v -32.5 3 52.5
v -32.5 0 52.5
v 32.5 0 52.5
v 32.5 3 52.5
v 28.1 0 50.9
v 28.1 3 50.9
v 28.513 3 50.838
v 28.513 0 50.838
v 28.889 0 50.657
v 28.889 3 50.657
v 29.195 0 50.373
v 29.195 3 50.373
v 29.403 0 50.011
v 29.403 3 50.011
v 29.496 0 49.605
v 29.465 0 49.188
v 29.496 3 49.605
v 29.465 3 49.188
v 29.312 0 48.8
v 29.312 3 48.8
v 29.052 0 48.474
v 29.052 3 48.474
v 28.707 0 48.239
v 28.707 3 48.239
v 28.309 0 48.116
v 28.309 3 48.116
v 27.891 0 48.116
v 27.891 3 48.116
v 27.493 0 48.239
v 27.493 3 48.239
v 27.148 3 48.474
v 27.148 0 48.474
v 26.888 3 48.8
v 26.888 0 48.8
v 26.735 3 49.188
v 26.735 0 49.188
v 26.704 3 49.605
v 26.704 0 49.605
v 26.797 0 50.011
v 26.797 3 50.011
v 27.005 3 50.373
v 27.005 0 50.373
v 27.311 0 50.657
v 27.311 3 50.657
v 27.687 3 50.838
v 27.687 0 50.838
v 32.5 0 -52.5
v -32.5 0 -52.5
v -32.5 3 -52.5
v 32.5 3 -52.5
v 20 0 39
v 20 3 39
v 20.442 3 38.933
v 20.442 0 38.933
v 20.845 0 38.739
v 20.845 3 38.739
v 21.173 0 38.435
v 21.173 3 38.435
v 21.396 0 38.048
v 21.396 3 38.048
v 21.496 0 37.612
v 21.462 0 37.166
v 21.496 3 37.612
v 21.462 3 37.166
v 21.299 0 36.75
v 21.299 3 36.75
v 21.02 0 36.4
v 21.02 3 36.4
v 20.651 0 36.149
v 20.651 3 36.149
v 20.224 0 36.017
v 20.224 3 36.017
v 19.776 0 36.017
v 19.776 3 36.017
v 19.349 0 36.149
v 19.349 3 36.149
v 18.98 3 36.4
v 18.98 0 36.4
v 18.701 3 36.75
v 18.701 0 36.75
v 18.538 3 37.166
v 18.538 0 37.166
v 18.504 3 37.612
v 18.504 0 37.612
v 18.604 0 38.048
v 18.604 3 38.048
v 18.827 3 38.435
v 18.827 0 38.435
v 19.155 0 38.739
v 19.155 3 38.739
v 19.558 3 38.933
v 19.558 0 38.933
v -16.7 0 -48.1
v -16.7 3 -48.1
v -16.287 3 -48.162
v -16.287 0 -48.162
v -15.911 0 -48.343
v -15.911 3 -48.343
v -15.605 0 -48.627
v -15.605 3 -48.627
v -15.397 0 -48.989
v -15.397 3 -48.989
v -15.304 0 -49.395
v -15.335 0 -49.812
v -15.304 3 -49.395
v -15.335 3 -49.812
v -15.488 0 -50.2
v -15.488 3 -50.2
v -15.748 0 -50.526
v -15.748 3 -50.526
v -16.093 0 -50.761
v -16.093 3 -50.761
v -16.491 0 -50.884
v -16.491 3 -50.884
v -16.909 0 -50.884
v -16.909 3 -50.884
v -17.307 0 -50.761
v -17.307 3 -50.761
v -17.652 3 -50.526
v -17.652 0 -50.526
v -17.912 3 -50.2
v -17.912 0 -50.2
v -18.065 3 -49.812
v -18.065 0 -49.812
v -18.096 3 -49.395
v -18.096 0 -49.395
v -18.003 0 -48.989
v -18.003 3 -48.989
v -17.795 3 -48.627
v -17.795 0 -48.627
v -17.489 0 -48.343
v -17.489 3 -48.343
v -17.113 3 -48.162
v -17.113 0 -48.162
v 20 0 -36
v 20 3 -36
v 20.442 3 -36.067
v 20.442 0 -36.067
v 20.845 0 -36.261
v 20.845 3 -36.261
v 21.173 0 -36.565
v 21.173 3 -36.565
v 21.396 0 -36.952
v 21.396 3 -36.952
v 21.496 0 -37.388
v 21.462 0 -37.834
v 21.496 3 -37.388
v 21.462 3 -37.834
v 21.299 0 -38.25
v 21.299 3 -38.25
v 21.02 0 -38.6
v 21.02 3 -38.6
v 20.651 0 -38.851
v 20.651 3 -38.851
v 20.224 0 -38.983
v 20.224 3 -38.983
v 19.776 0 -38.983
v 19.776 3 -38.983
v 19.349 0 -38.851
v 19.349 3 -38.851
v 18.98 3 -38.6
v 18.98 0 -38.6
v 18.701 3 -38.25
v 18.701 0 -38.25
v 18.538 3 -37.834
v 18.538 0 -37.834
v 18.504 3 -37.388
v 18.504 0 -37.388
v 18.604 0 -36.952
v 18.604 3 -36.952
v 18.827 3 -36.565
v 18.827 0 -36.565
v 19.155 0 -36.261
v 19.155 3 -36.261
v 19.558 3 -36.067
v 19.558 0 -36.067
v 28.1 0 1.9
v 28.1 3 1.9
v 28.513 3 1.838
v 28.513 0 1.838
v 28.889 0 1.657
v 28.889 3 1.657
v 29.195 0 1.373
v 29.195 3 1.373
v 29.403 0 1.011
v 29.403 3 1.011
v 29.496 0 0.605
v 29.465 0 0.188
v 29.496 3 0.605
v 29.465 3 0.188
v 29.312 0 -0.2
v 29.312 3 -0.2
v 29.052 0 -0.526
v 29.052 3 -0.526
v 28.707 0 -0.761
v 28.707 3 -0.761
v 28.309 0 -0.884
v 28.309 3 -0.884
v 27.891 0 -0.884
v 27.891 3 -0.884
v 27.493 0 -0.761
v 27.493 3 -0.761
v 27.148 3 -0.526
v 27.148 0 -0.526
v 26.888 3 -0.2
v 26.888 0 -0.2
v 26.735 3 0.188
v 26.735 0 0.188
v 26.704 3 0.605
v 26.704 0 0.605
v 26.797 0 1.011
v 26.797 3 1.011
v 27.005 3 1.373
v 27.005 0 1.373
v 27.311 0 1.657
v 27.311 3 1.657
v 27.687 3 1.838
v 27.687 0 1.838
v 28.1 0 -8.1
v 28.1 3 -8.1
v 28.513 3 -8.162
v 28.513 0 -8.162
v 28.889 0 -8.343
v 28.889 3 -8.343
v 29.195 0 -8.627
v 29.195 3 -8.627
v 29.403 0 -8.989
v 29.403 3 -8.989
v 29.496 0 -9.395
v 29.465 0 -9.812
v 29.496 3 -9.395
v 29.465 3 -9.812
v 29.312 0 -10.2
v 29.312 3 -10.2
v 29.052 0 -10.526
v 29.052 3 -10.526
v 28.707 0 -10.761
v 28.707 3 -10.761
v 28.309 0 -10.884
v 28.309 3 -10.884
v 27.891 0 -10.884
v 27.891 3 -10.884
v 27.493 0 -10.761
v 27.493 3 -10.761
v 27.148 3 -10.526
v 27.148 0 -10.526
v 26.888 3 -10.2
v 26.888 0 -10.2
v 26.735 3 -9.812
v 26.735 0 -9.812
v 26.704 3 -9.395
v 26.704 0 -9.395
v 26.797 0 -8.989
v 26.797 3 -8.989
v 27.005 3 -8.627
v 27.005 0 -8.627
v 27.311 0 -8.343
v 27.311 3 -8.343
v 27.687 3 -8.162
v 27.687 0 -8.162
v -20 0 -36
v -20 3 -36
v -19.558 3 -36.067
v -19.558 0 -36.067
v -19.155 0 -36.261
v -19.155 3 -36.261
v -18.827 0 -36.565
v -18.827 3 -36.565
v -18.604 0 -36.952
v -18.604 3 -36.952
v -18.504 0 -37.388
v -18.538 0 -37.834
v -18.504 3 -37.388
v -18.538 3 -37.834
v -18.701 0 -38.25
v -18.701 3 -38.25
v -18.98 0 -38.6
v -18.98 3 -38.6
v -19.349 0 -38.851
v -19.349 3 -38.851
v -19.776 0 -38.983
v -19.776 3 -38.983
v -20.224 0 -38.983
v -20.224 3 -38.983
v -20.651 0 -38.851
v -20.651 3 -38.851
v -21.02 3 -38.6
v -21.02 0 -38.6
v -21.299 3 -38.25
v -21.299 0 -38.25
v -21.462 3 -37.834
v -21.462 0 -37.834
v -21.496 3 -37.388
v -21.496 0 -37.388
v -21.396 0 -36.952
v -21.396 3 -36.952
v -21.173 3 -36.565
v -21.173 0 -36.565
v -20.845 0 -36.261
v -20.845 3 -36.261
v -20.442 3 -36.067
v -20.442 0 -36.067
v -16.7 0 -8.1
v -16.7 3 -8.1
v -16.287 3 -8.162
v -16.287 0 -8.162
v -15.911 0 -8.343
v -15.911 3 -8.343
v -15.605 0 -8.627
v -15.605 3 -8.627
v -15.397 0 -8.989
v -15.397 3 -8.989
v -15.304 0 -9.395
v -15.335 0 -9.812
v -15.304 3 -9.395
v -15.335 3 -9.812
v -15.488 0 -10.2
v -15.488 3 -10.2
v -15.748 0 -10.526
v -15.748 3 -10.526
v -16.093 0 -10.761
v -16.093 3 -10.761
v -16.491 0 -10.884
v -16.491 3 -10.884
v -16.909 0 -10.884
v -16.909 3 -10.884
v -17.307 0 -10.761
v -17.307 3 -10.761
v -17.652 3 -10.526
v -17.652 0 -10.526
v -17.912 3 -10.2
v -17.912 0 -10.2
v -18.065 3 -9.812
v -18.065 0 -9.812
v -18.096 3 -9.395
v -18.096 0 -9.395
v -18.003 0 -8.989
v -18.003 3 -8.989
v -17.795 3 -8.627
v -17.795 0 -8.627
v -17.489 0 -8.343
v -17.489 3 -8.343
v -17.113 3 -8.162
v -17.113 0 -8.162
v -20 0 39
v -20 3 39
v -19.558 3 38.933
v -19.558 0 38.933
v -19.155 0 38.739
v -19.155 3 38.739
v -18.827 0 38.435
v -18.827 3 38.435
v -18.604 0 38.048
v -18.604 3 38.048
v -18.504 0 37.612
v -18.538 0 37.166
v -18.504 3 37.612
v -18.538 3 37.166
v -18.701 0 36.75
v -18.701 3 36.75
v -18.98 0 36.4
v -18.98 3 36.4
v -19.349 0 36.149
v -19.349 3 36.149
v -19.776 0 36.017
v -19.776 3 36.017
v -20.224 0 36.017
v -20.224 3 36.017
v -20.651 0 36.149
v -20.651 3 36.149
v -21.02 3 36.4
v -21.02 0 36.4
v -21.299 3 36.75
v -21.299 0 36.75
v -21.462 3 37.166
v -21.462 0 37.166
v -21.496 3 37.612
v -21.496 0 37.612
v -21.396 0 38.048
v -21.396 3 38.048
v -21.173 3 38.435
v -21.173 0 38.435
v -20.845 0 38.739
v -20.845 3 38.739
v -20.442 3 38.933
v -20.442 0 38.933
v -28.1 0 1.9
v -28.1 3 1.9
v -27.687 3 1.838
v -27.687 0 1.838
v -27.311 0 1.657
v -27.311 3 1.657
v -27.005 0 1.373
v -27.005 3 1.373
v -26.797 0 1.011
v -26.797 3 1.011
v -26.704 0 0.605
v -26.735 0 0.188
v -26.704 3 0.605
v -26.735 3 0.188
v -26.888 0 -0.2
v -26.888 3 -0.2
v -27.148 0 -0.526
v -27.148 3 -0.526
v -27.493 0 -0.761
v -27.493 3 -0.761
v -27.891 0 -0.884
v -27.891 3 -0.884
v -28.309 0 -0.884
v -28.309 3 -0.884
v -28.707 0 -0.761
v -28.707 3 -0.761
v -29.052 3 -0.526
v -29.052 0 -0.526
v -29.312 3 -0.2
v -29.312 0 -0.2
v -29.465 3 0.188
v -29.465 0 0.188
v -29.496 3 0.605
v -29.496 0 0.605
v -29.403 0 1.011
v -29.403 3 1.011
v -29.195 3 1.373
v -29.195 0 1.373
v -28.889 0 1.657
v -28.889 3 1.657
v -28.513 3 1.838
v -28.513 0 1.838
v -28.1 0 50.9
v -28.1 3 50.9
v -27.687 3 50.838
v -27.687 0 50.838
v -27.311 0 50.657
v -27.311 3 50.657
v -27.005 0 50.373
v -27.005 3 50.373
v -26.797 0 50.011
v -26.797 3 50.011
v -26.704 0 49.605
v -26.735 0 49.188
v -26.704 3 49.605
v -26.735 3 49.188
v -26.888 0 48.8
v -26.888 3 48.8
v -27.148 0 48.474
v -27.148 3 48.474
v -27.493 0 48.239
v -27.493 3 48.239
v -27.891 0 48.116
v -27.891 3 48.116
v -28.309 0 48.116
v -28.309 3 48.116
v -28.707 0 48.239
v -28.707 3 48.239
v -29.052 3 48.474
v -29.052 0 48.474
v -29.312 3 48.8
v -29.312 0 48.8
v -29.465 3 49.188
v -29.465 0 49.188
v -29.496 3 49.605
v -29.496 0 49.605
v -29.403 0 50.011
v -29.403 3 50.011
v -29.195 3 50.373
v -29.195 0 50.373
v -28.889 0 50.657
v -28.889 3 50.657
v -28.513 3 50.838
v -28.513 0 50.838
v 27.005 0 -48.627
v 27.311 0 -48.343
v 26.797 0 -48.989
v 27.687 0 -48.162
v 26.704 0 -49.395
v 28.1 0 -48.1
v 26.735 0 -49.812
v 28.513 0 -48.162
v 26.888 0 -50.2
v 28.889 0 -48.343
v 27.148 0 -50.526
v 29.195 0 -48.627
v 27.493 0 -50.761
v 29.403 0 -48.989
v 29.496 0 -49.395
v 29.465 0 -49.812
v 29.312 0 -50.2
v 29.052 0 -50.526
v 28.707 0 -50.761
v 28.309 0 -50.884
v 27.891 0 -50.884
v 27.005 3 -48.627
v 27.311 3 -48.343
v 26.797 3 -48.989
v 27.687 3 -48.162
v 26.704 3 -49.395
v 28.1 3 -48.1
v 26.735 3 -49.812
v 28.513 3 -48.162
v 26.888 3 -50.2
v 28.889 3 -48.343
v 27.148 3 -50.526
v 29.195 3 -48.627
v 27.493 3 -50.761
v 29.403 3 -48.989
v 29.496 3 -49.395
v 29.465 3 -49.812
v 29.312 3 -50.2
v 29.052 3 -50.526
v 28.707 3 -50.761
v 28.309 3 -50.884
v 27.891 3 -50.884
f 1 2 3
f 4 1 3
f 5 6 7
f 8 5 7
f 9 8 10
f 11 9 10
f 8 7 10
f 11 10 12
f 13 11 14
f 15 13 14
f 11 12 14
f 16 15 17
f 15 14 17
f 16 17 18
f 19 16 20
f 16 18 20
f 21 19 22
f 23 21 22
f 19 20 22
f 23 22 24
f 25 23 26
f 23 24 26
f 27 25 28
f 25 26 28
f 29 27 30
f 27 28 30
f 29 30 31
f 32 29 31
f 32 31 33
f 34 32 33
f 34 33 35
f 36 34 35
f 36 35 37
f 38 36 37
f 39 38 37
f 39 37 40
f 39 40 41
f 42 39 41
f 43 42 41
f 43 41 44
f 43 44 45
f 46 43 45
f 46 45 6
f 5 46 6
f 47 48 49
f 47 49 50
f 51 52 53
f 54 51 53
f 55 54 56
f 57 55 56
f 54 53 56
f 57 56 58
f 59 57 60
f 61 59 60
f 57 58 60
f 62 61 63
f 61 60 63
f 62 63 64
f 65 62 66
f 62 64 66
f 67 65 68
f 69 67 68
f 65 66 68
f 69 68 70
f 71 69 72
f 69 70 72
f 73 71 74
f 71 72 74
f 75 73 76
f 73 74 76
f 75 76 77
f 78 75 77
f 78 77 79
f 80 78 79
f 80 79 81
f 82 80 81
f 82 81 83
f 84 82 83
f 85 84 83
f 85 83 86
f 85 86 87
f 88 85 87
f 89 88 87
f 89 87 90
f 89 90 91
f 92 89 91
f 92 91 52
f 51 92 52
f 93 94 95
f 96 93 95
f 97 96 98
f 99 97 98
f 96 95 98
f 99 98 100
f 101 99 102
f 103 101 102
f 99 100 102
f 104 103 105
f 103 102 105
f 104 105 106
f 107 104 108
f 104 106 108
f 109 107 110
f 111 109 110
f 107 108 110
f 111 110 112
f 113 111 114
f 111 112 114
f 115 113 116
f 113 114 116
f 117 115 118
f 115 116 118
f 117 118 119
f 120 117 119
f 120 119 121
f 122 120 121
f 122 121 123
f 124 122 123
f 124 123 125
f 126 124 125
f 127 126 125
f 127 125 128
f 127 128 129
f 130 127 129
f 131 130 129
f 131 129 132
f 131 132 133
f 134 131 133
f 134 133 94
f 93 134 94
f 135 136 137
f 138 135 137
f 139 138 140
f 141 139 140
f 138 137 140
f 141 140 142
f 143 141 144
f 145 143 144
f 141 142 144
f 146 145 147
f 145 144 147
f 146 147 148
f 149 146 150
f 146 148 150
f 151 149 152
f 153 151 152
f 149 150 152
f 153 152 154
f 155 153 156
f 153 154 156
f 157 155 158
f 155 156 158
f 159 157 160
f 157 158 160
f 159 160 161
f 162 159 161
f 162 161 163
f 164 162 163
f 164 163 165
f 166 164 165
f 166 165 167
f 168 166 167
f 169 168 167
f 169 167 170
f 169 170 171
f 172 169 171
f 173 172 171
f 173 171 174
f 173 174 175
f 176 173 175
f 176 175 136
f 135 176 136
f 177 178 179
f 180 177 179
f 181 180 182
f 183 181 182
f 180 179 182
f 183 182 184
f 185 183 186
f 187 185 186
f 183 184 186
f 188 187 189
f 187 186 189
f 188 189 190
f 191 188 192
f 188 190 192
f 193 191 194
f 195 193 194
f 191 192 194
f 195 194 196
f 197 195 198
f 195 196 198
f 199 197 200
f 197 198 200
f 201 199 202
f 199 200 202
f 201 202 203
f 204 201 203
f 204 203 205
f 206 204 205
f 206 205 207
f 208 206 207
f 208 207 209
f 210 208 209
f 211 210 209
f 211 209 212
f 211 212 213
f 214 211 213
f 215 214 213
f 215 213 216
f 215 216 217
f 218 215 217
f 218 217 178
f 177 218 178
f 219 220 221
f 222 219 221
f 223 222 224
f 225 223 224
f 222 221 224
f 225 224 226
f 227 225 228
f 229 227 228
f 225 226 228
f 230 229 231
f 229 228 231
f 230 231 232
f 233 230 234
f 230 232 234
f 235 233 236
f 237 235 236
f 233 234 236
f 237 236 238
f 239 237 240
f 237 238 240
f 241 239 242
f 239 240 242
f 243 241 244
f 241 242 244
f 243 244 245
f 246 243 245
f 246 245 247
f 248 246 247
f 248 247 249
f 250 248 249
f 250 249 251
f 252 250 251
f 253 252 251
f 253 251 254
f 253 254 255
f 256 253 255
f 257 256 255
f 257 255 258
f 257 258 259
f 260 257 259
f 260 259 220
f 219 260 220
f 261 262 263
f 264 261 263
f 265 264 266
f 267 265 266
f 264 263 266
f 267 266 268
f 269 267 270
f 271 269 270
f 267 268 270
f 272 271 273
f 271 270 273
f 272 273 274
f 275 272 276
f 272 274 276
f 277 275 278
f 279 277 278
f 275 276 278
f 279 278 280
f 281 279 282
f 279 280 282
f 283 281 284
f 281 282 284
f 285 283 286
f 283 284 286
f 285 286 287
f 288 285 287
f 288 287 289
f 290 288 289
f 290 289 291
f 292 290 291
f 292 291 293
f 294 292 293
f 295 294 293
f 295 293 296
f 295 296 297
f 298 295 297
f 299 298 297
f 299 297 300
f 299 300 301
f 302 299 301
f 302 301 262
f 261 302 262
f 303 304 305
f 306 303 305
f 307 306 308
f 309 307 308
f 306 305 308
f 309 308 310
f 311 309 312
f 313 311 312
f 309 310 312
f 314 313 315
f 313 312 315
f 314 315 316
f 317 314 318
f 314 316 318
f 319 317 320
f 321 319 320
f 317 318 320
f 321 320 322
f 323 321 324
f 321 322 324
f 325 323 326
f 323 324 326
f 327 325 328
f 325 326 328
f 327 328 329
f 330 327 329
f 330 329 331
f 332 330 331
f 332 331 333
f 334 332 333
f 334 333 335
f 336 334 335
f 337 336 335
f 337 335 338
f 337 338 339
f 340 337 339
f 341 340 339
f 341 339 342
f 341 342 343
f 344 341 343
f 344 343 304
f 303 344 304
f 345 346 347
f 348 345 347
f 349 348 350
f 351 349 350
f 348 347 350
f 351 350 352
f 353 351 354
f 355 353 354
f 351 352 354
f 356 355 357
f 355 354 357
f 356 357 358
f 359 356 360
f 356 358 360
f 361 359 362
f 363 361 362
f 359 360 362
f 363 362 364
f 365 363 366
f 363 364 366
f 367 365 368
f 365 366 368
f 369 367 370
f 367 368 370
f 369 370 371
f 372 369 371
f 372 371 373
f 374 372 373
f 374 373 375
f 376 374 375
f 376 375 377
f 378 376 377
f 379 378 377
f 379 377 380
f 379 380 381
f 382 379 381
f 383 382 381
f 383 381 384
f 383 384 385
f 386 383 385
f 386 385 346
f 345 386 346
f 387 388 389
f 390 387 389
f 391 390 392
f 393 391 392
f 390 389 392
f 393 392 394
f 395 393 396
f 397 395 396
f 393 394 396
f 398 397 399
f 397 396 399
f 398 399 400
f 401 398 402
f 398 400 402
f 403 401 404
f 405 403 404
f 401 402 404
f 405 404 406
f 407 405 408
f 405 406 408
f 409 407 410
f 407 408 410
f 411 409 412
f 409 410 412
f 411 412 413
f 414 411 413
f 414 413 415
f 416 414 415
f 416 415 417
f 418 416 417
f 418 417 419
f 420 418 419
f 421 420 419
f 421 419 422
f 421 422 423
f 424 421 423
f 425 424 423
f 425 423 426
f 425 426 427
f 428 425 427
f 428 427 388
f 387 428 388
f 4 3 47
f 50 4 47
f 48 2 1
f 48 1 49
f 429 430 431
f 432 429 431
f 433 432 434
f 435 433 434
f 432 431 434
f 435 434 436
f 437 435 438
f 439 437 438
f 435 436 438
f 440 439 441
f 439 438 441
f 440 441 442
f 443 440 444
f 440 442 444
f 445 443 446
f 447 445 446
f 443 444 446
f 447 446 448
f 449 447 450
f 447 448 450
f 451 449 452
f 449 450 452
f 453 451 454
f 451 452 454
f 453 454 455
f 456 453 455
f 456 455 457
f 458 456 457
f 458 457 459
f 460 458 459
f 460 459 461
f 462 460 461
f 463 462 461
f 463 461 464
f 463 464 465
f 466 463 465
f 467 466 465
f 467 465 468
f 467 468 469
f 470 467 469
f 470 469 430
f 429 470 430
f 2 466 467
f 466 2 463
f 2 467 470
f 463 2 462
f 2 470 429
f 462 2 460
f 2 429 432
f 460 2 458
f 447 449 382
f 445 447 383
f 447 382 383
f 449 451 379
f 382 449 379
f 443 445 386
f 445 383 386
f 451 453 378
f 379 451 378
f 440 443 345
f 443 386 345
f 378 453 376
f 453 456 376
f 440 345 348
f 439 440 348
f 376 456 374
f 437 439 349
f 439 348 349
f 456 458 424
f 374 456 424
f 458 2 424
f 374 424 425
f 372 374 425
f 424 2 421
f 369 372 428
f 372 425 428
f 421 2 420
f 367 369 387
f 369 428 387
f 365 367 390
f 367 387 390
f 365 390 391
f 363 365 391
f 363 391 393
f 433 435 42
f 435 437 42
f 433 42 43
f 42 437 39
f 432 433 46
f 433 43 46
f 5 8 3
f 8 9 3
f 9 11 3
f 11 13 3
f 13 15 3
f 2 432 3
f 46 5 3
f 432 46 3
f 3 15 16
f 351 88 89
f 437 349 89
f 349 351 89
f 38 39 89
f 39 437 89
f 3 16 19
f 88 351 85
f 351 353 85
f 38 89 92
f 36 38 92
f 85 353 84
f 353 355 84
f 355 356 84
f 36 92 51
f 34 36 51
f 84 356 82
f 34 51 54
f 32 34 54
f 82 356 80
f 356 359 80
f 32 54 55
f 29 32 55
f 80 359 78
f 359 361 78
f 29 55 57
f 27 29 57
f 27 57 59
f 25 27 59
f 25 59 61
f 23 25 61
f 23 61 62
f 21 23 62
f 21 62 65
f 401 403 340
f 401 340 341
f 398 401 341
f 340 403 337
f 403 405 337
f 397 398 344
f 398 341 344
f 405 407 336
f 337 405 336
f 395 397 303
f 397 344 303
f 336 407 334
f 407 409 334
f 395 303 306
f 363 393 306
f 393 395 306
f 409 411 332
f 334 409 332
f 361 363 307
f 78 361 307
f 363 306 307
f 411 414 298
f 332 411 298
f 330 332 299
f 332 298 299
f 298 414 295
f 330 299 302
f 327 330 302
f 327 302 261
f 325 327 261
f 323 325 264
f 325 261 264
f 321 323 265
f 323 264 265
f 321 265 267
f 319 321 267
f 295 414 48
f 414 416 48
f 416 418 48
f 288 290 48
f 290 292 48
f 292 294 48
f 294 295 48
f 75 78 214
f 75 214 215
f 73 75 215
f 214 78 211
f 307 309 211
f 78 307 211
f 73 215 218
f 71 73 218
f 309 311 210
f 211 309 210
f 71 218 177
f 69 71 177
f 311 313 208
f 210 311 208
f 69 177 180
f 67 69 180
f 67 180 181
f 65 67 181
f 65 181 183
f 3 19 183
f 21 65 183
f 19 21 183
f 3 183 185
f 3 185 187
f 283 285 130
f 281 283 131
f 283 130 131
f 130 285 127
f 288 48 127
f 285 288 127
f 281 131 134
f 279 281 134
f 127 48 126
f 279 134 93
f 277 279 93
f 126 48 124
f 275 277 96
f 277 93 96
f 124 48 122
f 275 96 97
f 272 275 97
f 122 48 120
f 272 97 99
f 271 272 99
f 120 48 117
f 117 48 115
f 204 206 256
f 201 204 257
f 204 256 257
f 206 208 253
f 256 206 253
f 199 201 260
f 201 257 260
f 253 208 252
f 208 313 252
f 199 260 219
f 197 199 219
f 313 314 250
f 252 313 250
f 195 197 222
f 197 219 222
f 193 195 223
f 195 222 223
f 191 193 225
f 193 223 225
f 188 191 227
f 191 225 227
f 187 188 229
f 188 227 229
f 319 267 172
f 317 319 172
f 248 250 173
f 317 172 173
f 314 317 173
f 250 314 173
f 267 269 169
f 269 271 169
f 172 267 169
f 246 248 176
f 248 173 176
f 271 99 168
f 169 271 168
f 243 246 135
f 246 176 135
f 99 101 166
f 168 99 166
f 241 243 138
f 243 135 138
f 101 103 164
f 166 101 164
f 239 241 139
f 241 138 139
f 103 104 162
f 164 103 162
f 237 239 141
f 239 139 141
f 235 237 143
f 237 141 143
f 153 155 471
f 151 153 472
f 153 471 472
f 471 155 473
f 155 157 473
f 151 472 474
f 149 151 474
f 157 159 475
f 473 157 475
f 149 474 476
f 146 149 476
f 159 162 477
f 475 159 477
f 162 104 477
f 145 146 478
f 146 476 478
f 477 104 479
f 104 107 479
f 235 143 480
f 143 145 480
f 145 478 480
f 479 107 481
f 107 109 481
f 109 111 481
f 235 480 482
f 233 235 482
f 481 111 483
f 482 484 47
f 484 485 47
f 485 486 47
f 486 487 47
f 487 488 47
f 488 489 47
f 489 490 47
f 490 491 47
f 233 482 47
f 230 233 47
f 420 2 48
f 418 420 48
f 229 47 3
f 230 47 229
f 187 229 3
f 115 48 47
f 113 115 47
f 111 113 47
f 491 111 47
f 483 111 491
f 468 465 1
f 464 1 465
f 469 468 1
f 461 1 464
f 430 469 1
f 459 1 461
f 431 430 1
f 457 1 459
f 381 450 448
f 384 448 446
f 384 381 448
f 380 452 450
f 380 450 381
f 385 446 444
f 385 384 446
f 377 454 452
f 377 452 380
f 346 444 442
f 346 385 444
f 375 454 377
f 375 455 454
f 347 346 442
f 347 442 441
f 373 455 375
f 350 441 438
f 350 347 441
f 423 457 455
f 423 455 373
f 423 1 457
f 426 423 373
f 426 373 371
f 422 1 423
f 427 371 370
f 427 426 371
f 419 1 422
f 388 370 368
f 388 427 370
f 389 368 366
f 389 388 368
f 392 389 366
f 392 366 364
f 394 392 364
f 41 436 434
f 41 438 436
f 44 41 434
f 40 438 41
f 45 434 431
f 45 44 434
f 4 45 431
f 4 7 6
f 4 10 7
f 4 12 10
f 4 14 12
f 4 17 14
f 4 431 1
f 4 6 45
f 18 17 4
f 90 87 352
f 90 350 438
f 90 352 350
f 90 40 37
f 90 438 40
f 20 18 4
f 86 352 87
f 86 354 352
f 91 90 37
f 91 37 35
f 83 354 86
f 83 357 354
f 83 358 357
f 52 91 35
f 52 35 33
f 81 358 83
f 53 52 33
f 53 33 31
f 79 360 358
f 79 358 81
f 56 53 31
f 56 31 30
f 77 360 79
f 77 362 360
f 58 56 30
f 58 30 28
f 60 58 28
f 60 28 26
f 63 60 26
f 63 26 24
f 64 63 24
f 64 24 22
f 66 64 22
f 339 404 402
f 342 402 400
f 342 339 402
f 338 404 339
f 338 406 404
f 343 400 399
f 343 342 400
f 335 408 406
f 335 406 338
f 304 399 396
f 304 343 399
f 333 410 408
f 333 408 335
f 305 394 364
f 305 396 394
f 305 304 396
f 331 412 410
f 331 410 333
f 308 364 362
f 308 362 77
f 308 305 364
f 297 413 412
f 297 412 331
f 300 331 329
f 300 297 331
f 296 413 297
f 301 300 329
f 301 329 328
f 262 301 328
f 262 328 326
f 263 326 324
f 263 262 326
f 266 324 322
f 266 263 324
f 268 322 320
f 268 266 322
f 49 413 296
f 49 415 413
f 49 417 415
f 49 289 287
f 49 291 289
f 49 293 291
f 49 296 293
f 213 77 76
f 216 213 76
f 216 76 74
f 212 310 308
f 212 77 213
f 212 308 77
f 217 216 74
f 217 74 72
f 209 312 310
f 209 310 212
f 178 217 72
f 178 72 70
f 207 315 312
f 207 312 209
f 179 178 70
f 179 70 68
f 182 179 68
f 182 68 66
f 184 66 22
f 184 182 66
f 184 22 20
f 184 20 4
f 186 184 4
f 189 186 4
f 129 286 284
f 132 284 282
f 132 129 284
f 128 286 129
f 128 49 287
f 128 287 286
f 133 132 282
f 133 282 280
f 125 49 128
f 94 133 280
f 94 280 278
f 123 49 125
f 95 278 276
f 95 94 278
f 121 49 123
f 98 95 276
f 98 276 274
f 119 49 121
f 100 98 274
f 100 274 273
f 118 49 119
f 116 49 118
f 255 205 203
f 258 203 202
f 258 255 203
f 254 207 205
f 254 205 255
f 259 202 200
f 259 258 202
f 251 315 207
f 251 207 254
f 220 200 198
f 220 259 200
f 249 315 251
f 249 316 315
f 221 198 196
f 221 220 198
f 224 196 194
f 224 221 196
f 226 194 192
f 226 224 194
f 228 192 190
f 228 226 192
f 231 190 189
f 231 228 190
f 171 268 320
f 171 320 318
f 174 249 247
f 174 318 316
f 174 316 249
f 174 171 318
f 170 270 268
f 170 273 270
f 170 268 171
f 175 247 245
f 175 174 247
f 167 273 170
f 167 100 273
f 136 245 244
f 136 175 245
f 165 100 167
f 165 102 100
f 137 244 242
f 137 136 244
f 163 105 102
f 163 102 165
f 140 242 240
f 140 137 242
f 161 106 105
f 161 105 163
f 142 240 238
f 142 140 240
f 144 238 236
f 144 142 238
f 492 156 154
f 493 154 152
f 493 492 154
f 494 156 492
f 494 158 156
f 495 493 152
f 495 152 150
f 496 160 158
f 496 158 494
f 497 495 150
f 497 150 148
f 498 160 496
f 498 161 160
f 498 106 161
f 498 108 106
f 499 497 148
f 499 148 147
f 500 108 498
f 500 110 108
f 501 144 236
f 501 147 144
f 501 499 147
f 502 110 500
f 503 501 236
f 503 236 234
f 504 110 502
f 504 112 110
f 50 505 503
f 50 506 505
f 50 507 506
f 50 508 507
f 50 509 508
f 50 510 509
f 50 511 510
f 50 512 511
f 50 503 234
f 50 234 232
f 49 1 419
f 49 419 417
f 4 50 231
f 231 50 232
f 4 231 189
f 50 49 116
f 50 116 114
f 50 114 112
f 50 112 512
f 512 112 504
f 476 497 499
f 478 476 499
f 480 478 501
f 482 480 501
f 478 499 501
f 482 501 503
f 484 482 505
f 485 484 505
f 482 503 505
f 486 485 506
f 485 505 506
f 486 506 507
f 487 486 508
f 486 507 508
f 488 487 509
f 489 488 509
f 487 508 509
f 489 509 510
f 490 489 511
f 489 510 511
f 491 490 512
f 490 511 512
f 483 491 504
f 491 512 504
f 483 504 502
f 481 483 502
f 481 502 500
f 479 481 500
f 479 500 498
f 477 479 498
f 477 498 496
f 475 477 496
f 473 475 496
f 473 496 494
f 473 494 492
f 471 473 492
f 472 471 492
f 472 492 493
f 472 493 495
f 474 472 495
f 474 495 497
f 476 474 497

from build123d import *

# Parameters (mm, degrees)
SKETCH_1_W          = 65
SKETCH_1_H          = 105
EXTRUDE_1_DEPTH     = 3
SKETCH_2_R          = 1.4
CUT_EXTRUDE_1_DEPTH = 62.818282085
SKETCH_3_R          = 1.4
CUT_EXTRUDE_2_DEPTH = 62.818282085
SKETCH_6_R          = 1.5
CUT_EXTRUDE_5_DEPTH = 62.818282085


with BuildPart() as part:
    # 草图1 → 凸台-拉伸1 (new body)
    with BuildSketch(Plane(origin=(0, 0, 0), x_dir=(1, 0, 0), z_dir=(0, 1, 0))):
        Rectangle(SKETCH_1_W, SKETCH_1_H)
    extrude(amount=EXTRUDE_1_DEPTH)

    # 草图2 → 切除-拉伸1 (cut, through all)
    with BuildSketch(Plane(origin=(0, 3, 0), x_dir=(1, 0, 0), z_dir=(0, 1, 0))):
        with Locations(Location((-28.1, -49.5, 0), (0, 0, 270))):
            Circle(SKETCH_2_R)
        with Locations(Location((28.1, -49.5, 0), (0, 0, 270))):
            Circle(SKETCH_2_R)
        with Locations(Location((28.1, -0.5, 0), (0, 0, 270))):
            Circle(SKETCH_2_R)
        with Locations(Location((-28.1, -0.5, 0), (0, 0, 270))):
            Circle(SKETCH_2_R)
    extrude(amount=-CUT_EXTRUDE_1_DEPTH, mode=Mode.SUBTRACT)

    # 草图3 → 切除-拉伸2 (cut, through all)
    with BuildSketch(Plane(origin=(0, 3, 0), x_dir=(1, 0, 0), z_dir=(0, 1, 0))):
        with Locations(Location((-16.7, 9.5, 0), (0, 0, 270))):
            Circle(SKETCH_3_R)
        with Locations(Location((28.1, 9.5, 0), (0, 0, 270))):
            Circle(SKETCH_3_R)
        with Locations(Location((28.1, 49.5, 0), (0, 0, 270))):
            Circle(SKETCH_3_R)
        with Locations(Location((-16.7, 49.5, 0), (0, 0, 270))):
            Circle(SKETCH_3_R)
    extrude(amount=-CUT_EXTRUDE_2_DEPTH, mode=Mode.SUBTRACT)

    # 草图6 → 切除-拉伸5 (cut, through all)
    with BuildSketch(Plane(origin=(0, 3, 0), x_dir=(1, 0, 0), z_dir=(0, 1, 0))):
        with Locations(Location((-20, -37.5, 0), (0, 0, 270))):
            Circle(SKETCH_6_R)
        with Locations(Location((20, -37.5, 0), (0, 0, 270))):
            Circle(SKETCH_6_R)
        with Locations(Location((20, 37.5, 0), (0, 0, 270))):
            Circle(SKETCH_6_R)
        with Locations(Location((-20, 37.5, 0), (0, 0, 270))):
            Circle(SKETCH_6_R)
    extrude(amount=-CUT_EXTRUDE_5_DEPTH, mode=Mode.SUBTRACT)


solid = part.part
